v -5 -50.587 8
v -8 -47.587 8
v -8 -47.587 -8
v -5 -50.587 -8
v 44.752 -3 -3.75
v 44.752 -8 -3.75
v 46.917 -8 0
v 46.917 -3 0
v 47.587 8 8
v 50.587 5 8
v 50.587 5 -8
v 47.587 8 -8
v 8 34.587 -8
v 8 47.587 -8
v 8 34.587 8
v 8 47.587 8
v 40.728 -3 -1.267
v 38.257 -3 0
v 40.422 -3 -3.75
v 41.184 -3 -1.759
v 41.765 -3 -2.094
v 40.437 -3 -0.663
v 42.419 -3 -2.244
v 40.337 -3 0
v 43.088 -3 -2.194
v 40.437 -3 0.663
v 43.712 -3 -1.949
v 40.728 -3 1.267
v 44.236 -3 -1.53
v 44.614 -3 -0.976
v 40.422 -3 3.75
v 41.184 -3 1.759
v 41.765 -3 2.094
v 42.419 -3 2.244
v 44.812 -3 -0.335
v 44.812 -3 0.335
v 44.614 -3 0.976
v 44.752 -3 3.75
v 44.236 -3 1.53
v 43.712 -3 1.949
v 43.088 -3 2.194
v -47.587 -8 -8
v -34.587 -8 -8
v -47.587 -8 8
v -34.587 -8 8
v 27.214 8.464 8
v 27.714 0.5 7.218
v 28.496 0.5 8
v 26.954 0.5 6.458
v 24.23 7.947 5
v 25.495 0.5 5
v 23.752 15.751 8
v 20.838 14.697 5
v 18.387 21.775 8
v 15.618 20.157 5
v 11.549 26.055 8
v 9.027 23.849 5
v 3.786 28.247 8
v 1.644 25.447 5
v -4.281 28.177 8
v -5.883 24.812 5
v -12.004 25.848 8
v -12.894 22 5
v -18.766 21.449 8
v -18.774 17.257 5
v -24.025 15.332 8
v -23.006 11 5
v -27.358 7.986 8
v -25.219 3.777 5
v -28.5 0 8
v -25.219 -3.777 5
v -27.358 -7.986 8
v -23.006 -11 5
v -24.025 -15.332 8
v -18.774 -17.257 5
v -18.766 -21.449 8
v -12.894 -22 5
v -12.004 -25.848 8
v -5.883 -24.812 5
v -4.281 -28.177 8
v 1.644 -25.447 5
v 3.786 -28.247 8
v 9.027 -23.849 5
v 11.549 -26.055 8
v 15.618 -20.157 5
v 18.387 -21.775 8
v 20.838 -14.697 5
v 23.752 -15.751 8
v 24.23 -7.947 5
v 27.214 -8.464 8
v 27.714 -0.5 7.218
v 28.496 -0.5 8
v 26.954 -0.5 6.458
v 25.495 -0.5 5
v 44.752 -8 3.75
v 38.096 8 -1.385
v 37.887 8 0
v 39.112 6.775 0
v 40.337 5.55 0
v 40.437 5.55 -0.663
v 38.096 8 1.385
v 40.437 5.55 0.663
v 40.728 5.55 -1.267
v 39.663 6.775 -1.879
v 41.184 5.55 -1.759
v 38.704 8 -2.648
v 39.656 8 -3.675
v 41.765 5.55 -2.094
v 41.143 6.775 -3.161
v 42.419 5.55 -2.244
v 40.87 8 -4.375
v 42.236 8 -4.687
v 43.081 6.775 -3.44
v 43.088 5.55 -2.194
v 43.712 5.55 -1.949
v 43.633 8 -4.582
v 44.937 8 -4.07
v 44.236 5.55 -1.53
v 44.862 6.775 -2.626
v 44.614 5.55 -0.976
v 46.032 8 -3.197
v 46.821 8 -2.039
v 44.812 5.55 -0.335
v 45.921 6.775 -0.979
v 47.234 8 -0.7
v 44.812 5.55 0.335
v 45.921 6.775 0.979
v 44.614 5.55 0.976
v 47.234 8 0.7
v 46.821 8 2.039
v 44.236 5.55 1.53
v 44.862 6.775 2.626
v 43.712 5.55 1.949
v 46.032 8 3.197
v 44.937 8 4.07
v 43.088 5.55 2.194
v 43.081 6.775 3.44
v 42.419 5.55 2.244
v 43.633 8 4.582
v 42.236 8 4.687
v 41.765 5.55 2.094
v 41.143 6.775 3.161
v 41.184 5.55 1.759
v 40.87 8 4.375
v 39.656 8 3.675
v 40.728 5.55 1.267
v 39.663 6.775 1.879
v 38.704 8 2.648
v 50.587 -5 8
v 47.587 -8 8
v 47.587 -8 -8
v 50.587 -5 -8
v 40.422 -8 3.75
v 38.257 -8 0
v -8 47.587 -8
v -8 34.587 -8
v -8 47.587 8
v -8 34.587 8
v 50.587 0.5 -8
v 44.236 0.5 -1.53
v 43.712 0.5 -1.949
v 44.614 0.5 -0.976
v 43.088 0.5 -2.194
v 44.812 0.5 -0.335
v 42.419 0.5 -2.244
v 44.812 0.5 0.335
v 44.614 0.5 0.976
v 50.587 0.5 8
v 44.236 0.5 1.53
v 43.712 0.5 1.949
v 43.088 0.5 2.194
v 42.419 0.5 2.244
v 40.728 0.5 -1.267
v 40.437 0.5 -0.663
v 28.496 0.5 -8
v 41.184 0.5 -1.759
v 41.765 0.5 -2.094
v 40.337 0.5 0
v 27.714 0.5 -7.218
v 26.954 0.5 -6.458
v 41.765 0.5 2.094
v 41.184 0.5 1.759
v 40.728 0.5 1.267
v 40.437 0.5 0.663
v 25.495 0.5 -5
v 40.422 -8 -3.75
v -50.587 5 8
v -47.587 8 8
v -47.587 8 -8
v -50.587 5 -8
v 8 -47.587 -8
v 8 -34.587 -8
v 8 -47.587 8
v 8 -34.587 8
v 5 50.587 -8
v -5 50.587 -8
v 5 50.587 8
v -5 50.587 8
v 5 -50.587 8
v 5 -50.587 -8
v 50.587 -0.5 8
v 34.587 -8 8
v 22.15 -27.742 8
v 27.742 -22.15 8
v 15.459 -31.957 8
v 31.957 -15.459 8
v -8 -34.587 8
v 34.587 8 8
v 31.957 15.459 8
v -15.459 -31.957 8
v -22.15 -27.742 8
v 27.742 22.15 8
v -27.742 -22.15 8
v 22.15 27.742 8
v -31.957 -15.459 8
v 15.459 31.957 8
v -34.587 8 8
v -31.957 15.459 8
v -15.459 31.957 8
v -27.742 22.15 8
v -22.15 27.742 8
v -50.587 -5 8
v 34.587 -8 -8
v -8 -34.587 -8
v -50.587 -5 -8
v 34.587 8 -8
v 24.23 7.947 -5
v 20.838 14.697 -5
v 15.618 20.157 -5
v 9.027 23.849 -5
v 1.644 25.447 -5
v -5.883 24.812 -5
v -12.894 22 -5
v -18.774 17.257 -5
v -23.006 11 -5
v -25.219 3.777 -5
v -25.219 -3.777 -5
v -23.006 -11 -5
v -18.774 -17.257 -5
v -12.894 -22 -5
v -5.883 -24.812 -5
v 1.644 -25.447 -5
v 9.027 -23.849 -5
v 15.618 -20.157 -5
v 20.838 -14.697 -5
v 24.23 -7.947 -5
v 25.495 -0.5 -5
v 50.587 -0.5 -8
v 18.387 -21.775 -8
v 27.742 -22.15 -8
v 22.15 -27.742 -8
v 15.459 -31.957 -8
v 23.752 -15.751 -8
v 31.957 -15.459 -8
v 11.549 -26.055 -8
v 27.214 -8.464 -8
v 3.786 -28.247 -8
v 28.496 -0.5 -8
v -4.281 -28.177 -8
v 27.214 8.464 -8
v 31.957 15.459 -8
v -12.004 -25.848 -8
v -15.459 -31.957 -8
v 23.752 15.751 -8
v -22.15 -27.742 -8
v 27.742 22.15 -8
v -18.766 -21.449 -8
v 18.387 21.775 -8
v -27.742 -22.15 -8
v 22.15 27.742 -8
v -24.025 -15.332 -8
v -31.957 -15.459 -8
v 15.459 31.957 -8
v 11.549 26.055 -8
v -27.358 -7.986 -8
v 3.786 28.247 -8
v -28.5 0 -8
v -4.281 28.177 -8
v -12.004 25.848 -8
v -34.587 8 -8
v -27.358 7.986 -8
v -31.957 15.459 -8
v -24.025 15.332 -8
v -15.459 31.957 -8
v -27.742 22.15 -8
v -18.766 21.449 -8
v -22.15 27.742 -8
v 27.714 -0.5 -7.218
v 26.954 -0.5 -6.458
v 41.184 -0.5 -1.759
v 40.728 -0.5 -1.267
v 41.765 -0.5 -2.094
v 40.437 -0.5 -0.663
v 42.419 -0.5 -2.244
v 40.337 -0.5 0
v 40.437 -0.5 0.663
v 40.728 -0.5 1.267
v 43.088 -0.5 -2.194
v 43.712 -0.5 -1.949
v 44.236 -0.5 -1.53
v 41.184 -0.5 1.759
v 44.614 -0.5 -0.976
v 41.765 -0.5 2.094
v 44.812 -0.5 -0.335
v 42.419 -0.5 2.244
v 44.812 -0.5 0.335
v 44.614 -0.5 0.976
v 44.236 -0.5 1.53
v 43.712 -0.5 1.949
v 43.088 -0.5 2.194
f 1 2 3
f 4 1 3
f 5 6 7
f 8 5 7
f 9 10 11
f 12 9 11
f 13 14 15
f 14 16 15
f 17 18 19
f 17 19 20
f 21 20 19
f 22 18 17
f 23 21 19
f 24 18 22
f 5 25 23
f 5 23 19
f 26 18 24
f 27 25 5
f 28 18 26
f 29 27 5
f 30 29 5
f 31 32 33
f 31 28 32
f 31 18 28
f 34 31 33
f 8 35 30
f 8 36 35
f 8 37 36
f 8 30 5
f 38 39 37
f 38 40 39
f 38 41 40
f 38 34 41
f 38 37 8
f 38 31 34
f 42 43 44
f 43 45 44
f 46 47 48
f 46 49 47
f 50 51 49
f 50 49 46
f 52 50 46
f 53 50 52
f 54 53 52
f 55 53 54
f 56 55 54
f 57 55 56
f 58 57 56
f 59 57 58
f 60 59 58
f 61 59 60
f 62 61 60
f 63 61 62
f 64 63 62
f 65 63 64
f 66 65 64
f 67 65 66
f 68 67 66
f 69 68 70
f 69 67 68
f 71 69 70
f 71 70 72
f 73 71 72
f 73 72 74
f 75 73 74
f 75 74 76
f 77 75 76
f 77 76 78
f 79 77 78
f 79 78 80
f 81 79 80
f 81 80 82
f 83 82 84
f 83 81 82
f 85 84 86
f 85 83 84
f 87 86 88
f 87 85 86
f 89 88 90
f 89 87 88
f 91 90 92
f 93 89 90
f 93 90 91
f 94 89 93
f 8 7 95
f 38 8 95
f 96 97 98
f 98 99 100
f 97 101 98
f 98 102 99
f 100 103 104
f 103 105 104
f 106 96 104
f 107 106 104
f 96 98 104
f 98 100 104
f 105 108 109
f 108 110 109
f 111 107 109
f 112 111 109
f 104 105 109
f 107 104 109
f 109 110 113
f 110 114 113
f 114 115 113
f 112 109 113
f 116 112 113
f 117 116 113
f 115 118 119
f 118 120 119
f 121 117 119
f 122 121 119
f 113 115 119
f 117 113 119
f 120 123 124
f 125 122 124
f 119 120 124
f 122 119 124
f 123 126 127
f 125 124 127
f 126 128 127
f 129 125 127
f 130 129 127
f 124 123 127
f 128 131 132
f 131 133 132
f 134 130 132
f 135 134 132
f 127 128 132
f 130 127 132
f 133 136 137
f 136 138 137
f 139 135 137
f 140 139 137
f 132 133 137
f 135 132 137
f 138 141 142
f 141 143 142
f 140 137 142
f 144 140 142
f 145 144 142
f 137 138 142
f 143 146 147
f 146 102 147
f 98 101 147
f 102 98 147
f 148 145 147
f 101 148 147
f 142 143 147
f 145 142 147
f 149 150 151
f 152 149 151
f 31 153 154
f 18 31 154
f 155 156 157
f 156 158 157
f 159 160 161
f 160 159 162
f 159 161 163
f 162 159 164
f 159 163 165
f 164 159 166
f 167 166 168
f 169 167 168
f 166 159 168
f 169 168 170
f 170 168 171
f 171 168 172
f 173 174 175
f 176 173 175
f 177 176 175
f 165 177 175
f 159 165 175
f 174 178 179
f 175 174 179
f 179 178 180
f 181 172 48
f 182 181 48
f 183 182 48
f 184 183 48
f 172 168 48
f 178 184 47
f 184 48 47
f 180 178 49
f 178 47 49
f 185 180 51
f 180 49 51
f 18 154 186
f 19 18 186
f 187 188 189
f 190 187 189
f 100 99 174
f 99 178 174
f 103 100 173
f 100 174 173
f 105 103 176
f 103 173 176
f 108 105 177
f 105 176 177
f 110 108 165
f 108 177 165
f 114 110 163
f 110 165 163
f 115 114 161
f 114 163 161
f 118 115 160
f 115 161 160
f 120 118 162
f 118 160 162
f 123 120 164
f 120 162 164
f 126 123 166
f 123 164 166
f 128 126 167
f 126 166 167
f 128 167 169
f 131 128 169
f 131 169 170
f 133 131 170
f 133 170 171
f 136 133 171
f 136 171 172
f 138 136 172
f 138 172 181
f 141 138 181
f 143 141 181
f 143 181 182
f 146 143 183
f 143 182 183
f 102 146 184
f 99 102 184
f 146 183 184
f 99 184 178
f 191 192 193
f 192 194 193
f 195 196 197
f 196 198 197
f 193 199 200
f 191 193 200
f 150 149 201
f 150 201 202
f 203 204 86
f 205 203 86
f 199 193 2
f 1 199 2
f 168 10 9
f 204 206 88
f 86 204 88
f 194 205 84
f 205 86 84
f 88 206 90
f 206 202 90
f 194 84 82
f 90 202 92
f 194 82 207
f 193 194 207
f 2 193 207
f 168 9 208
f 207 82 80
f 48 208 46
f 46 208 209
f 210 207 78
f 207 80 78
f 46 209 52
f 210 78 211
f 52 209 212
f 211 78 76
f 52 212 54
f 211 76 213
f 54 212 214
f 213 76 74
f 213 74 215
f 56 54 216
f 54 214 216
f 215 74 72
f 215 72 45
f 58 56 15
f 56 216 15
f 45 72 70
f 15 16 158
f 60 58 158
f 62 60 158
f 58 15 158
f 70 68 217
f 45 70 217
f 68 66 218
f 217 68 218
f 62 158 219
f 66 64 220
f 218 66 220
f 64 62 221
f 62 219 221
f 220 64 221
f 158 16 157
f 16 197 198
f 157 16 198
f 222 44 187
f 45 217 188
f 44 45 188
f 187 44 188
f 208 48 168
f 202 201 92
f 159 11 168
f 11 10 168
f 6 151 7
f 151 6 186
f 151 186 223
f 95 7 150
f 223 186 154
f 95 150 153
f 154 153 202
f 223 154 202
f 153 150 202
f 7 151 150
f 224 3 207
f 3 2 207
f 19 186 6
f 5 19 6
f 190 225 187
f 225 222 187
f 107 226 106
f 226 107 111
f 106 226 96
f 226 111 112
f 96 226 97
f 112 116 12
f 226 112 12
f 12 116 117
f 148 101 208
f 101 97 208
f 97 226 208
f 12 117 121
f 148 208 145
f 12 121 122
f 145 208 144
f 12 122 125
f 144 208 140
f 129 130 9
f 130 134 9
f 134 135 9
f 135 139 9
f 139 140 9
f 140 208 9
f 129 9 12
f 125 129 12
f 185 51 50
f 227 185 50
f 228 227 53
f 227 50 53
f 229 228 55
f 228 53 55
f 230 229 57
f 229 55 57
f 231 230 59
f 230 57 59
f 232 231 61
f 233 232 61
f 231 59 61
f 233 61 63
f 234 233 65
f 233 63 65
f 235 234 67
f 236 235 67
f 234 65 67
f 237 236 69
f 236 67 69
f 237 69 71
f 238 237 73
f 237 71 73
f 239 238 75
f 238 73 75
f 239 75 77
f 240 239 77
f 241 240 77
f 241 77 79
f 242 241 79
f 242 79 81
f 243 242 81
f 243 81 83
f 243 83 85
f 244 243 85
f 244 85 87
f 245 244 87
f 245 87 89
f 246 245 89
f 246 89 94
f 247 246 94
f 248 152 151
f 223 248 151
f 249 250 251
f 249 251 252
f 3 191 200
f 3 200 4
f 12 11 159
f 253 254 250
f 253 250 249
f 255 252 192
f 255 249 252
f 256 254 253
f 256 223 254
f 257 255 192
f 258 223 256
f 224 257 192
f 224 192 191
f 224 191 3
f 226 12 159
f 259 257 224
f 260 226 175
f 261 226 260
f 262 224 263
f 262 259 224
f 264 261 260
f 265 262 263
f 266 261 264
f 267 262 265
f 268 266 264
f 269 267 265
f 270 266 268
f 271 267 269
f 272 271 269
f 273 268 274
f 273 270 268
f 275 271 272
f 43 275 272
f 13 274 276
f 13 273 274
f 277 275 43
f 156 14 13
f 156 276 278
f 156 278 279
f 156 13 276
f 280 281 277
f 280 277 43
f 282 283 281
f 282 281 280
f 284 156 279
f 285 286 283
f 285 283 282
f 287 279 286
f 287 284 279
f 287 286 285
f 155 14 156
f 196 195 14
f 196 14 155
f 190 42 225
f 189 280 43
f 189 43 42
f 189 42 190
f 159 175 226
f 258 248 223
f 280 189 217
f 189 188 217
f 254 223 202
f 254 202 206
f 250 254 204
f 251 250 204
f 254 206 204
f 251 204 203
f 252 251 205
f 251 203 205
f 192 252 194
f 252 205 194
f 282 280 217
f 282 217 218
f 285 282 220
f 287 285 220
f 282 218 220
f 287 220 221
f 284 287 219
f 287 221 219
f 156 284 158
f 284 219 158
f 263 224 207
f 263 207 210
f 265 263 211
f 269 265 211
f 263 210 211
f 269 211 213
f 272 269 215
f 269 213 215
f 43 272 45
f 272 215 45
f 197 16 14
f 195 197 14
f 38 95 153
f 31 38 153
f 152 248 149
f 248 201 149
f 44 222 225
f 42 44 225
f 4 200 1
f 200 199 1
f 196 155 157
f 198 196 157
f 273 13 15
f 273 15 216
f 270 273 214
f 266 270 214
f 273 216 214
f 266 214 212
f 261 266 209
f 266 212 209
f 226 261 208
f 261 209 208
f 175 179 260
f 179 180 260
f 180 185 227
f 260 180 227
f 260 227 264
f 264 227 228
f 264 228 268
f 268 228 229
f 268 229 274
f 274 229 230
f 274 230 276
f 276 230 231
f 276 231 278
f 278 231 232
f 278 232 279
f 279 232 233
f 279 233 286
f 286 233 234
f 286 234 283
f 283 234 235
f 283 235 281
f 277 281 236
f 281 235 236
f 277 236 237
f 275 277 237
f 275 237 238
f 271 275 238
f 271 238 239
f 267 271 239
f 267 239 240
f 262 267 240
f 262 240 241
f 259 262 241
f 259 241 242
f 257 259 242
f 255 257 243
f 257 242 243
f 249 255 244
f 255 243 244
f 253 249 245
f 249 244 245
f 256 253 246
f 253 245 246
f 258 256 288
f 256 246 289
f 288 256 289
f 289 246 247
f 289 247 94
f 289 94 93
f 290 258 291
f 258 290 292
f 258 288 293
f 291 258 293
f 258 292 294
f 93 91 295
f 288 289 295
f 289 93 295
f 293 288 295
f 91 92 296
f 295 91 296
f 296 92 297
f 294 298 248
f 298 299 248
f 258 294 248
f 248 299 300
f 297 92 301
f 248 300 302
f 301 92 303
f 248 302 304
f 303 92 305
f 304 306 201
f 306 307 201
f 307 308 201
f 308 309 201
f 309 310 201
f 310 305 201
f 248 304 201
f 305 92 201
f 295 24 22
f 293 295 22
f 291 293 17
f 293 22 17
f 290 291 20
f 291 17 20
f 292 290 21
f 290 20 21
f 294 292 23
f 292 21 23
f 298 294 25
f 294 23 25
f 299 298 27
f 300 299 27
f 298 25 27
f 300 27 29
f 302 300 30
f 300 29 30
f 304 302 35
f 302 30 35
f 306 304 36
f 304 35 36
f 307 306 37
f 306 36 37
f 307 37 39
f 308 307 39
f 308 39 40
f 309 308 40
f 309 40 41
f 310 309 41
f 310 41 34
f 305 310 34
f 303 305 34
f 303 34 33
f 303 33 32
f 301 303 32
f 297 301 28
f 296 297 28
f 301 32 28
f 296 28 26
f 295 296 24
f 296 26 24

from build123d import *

# Parameters (mm, degrees)
EXTRUDE_1_DEPTH             = 8
HOLE_WIZARD_M41_D           = 4.5
HOLE_WIZARD_M41_CSINK_D     = 9.4
HOLE_WIZARD_M41_CSINK_ANGLE = 90
CUT_EXTRUDE_2_DEPTH         = 5
CHAMFER_1_SIZE              = 3


with BuildPart() as part:
    # Эскиз1 → Бобышка-Вытянуть1 (new, symmetric)
    with BuildSketch(Plane.XY):
        with BuildLine():
            Line((-8, 50.586847211), (8, 50.586847211))
            Line((8, 50.586847211), (8, 34.586847211))
            ThreePointArc((8, 34.586847211), (25.102290732, 25.102290732), (34.586847211, 8))
            Line((34.586847211, 8), (50.586847211, 8))
            Line((50.586847211, 8), (50.586847211, 0.5))
            Line((50.586847211, 0.5), (25.495097568, 0.5))
            ThreePointArc((25.495097568, 0.5), (-25.5, 0), (25.495097568, -0.5))
            Line((25.495097568, -0.5), (50.586847211, -0.5))
            Line((50.586847211, -0.5), (50.586847211, -8))
            Line((50.586847211, -8), (34.586847211, -8))
            ThreePointArc((34.586847211, -8), (25.102290732, -25.102290732), (8, -34.586847211))
            Line((8, -34.586847211), (8, -50.586847211))
            Line((8, -50.586847211), (-8, -50.586847211))
            Line((-8, -50.586847211), (-8, -34.586847211))
            ThreePointArc((-8, -34.586847211), (-25.102290732, -25.102290732), (-34.586847211, -8))
            Line((-34.586847211, -8), (-50.586847211, -8))
            Line((-50.586847211, -8), (-50.586847211, 8))
            Line((-50.586847211, 8), (-34.586847211, 8))
            ThreePointArc((-34.586847211, 8), (-25.102290732, 25.102290732), (-8, 34.586847211))
            Line((-8, 34.586847211), (-8, 50.586847211))
        make_face()
    extrude(amount=EXTRUDE_1_DEPTH, both=True)

    # Зенковка для винта с полупотайной головкой M41 (through all)
    with Locations(Plane(origin=(42.586847211, 8, 0), x_dir=(1, 0, 0), z_dir=(0, 1, 0))):
        with Locations((0, 0)):
            CounterSinkHole(HOLE_WIZARD_M41_D / 2, HOLE_WIZARD_M41_CSINK_D / 2, counter_sink_angle=HOLE_WIZARD_M41_CSINK_ANGLE)

    # Эскиз5 → Вырез-Вытянуть2 (cut)
    with BuildSketch(Plane.XZ.offset(8)):
        Polygon((46.91697423, 0), (44.751910721, 3.75), (40.421783702, 3.75), (38.256720192, 0), (40.421783702, -3.75), (44.751910721, -3.75), align=None)
    extrude(amount=-CUT_EXTRUDE_2_DEPTH, mode=Mode.SUBTRACT)

    # Фаска1
    chamfer_1_edges = [part.edges().sort_by_distance(p)[0] for p in [
        (-25.5, 0, -8),
        (50.586847211, -8, 0),
        (8, -50.586847211, 0),
        (-8, -50.586847211, 0),
        (-50.586847211, -8, 0),
        (-50.586847211, 8, 0),
        (-8, 50.586847211, 0),
        (8, 50.586847211, 0),
        (50.586847211, 8, 0),
        (-25.5, 0, 8),
    ]]
    chamfer(chamfer_1_edges, length=CHAMFER_1_SIZE)


solid = part.part
